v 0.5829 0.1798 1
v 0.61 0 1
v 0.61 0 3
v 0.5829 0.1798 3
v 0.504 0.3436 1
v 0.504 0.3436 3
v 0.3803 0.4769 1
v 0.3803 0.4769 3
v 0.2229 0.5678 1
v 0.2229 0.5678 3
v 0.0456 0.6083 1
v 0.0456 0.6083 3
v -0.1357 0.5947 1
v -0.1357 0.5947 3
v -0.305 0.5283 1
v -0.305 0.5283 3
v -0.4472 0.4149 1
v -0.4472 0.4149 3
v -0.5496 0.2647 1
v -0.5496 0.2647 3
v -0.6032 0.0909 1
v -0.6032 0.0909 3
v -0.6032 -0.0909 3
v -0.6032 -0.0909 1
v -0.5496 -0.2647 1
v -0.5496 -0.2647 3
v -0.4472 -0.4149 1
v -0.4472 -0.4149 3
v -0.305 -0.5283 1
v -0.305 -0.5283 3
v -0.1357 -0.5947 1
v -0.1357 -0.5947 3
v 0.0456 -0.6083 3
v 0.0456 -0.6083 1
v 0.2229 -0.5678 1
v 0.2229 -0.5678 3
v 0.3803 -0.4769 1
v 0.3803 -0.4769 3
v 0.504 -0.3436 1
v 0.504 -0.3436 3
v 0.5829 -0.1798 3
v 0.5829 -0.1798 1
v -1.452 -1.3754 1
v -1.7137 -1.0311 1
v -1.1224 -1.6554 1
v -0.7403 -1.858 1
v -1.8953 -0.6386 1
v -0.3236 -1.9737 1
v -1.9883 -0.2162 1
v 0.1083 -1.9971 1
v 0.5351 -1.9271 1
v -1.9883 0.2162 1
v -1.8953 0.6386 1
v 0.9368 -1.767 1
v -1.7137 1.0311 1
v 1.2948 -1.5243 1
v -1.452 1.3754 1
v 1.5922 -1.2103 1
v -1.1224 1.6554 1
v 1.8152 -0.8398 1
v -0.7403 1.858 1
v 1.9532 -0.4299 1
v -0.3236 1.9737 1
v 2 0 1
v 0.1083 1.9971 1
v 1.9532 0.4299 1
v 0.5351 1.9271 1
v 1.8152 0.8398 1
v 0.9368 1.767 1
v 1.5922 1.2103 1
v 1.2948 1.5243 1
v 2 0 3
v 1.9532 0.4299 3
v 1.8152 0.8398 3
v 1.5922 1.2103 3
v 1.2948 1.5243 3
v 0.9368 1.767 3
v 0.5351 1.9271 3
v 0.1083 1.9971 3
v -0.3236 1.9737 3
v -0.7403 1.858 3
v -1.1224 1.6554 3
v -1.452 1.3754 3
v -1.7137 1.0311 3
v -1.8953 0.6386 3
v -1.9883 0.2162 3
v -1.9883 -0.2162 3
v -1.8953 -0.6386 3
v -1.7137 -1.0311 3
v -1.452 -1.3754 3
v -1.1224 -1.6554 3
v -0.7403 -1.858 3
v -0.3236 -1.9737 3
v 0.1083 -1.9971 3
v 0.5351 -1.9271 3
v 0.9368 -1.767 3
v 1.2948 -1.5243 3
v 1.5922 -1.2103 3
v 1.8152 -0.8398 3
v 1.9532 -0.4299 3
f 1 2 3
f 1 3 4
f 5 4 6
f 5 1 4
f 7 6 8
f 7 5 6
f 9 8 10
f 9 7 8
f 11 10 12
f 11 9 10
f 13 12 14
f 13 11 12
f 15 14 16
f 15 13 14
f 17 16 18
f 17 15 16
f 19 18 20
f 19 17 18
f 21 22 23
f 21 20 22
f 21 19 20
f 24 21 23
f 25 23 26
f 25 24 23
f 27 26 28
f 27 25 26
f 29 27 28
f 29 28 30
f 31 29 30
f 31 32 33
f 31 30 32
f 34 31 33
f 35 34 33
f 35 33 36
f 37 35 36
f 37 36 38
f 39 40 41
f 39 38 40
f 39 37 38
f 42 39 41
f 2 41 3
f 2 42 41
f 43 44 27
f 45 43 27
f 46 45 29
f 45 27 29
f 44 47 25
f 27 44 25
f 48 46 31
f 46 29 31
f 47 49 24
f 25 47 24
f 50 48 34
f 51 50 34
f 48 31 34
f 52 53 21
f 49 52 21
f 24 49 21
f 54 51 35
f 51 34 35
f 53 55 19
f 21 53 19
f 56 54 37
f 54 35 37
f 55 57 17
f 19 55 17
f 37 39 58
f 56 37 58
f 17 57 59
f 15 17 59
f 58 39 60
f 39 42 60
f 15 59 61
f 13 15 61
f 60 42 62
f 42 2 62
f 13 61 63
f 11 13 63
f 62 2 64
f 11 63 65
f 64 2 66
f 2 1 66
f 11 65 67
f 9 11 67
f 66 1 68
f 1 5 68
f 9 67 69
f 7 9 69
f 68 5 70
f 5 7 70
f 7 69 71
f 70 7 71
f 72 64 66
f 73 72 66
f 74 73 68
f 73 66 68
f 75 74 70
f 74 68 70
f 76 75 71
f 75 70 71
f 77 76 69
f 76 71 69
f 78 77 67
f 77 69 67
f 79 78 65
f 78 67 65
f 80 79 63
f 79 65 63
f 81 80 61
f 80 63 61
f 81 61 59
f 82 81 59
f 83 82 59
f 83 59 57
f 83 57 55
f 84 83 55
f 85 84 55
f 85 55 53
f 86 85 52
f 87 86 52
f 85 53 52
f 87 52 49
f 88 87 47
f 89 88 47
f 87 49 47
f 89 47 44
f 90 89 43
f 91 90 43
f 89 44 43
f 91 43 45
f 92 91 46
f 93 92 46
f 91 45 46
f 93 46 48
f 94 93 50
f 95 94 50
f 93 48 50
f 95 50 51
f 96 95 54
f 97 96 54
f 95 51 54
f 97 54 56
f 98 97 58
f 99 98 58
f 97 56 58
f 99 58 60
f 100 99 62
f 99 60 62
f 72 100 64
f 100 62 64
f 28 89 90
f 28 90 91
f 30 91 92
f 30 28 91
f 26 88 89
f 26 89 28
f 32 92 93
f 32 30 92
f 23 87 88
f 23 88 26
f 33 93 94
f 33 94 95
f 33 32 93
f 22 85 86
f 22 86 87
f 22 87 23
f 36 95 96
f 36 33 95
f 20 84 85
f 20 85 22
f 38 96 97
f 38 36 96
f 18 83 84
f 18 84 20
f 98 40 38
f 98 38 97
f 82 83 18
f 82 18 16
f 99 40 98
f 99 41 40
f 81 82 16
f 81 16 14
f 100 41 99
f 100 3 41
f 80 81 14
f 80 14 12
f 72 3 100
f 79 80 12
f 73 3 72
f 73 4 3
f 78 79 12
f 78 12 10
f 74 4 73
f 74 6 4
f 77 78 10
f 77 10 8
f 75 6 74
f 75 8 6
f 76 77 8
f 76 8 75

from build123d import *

# Parameters (mm, degrees)
CYLINDER003_R     = 0.61
CYLINDER003_DEPTH = 10
CYLINDER006_R     = 2
CYLINDER006_DEPTH = 2


with BuildPart() as cylinder003:
    # Cylinder003 → Cylinder003 (new body)
    with BuildSketch(Plane.XY):
        Circle(CYLINDER003_R)
    extrude(amount=CYLINDER003_DEPTH)


with BuildPart() as coilfront:
    # Cylinder006 → Cylinder006 (new body)
    with BuildSketch(Plane.XY.offset(1)):
        Circle(CYLINDER006_R)
    extrude(amount=CYLINDER006_DEPTH)

    # Cut006: cut Cylinder003
    add(cylinder003.part, mode=Mode.SUBTRACT)


solid = coilfront.part
